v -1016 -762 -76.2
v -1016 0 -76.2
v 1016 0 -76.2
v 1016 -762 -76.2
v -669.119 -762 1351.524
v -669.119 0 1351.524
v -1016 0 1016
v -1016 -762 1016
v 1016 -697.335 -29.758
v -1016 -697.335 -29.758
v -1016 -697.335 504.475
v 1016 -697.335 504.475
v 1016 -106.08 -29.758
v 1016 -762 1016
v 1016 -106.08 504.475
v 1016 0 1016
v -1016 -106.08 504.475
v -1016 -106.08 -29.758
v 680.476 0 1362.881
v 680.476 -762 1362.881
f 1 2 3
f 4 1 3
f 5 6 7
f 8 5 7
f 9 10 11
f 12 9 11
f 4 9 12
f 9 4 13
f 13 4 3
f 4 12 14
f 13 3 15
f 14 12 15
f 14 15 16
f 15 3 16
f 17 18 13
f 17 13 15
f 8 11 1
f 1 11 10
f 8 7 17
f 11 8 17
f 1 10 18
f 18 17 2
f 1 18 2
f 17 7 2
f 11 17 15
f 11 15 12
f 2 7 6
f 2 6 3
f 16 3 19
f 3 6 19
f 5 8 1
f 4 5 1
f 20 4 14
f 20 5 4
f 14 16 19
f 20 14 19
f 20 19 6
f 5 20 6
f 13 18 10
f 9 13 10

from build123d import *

# Parameters (mm, degrees)
F0_W     = 2032
F0_H     = 508
F1_DEPTH = 762
F2_W     = 591.2553668022
F2_H     = 534.2325568199
F3_DEPTH = 2032


with BuildPart() as f1:
    # F0 (on Front) → F1 (new body)
    with BuildSketch(Plane.XZ):
        Polygon((1016, 0), (0, 0), (-1016, 0), (-1016, -76.2), (1016, -76.2), align=None)
        Polygon((-1016, 0), (0, 0), (1016, 0), (1016, 508), (-1016, 508), align=None)
        with Locations((0, 762)):
            Rectangle(F0_W, F0_H)
        Polygon((-669.1186458851, 1351.5236000156), (-1016, 1016), (1016, 1016), (680.4763999844, 1362.8813541149), align=None)
    extrude(amount=F1_DEPTH)

    # F2 (on face) → F3 (cut)
    with BuildSketch(Plane(origin=(-1016, 0, 0), x_dir=(0, -1, 0), z_dir=(-1, 0, 0))):
        with Locations((401.707559824, 237.3584806919)):
            Rectangle(F2_W, F2_H)
    extrude(amount=-F3_DEPTH, mode=Mode.SUBTRACT)


solid = f1.part
